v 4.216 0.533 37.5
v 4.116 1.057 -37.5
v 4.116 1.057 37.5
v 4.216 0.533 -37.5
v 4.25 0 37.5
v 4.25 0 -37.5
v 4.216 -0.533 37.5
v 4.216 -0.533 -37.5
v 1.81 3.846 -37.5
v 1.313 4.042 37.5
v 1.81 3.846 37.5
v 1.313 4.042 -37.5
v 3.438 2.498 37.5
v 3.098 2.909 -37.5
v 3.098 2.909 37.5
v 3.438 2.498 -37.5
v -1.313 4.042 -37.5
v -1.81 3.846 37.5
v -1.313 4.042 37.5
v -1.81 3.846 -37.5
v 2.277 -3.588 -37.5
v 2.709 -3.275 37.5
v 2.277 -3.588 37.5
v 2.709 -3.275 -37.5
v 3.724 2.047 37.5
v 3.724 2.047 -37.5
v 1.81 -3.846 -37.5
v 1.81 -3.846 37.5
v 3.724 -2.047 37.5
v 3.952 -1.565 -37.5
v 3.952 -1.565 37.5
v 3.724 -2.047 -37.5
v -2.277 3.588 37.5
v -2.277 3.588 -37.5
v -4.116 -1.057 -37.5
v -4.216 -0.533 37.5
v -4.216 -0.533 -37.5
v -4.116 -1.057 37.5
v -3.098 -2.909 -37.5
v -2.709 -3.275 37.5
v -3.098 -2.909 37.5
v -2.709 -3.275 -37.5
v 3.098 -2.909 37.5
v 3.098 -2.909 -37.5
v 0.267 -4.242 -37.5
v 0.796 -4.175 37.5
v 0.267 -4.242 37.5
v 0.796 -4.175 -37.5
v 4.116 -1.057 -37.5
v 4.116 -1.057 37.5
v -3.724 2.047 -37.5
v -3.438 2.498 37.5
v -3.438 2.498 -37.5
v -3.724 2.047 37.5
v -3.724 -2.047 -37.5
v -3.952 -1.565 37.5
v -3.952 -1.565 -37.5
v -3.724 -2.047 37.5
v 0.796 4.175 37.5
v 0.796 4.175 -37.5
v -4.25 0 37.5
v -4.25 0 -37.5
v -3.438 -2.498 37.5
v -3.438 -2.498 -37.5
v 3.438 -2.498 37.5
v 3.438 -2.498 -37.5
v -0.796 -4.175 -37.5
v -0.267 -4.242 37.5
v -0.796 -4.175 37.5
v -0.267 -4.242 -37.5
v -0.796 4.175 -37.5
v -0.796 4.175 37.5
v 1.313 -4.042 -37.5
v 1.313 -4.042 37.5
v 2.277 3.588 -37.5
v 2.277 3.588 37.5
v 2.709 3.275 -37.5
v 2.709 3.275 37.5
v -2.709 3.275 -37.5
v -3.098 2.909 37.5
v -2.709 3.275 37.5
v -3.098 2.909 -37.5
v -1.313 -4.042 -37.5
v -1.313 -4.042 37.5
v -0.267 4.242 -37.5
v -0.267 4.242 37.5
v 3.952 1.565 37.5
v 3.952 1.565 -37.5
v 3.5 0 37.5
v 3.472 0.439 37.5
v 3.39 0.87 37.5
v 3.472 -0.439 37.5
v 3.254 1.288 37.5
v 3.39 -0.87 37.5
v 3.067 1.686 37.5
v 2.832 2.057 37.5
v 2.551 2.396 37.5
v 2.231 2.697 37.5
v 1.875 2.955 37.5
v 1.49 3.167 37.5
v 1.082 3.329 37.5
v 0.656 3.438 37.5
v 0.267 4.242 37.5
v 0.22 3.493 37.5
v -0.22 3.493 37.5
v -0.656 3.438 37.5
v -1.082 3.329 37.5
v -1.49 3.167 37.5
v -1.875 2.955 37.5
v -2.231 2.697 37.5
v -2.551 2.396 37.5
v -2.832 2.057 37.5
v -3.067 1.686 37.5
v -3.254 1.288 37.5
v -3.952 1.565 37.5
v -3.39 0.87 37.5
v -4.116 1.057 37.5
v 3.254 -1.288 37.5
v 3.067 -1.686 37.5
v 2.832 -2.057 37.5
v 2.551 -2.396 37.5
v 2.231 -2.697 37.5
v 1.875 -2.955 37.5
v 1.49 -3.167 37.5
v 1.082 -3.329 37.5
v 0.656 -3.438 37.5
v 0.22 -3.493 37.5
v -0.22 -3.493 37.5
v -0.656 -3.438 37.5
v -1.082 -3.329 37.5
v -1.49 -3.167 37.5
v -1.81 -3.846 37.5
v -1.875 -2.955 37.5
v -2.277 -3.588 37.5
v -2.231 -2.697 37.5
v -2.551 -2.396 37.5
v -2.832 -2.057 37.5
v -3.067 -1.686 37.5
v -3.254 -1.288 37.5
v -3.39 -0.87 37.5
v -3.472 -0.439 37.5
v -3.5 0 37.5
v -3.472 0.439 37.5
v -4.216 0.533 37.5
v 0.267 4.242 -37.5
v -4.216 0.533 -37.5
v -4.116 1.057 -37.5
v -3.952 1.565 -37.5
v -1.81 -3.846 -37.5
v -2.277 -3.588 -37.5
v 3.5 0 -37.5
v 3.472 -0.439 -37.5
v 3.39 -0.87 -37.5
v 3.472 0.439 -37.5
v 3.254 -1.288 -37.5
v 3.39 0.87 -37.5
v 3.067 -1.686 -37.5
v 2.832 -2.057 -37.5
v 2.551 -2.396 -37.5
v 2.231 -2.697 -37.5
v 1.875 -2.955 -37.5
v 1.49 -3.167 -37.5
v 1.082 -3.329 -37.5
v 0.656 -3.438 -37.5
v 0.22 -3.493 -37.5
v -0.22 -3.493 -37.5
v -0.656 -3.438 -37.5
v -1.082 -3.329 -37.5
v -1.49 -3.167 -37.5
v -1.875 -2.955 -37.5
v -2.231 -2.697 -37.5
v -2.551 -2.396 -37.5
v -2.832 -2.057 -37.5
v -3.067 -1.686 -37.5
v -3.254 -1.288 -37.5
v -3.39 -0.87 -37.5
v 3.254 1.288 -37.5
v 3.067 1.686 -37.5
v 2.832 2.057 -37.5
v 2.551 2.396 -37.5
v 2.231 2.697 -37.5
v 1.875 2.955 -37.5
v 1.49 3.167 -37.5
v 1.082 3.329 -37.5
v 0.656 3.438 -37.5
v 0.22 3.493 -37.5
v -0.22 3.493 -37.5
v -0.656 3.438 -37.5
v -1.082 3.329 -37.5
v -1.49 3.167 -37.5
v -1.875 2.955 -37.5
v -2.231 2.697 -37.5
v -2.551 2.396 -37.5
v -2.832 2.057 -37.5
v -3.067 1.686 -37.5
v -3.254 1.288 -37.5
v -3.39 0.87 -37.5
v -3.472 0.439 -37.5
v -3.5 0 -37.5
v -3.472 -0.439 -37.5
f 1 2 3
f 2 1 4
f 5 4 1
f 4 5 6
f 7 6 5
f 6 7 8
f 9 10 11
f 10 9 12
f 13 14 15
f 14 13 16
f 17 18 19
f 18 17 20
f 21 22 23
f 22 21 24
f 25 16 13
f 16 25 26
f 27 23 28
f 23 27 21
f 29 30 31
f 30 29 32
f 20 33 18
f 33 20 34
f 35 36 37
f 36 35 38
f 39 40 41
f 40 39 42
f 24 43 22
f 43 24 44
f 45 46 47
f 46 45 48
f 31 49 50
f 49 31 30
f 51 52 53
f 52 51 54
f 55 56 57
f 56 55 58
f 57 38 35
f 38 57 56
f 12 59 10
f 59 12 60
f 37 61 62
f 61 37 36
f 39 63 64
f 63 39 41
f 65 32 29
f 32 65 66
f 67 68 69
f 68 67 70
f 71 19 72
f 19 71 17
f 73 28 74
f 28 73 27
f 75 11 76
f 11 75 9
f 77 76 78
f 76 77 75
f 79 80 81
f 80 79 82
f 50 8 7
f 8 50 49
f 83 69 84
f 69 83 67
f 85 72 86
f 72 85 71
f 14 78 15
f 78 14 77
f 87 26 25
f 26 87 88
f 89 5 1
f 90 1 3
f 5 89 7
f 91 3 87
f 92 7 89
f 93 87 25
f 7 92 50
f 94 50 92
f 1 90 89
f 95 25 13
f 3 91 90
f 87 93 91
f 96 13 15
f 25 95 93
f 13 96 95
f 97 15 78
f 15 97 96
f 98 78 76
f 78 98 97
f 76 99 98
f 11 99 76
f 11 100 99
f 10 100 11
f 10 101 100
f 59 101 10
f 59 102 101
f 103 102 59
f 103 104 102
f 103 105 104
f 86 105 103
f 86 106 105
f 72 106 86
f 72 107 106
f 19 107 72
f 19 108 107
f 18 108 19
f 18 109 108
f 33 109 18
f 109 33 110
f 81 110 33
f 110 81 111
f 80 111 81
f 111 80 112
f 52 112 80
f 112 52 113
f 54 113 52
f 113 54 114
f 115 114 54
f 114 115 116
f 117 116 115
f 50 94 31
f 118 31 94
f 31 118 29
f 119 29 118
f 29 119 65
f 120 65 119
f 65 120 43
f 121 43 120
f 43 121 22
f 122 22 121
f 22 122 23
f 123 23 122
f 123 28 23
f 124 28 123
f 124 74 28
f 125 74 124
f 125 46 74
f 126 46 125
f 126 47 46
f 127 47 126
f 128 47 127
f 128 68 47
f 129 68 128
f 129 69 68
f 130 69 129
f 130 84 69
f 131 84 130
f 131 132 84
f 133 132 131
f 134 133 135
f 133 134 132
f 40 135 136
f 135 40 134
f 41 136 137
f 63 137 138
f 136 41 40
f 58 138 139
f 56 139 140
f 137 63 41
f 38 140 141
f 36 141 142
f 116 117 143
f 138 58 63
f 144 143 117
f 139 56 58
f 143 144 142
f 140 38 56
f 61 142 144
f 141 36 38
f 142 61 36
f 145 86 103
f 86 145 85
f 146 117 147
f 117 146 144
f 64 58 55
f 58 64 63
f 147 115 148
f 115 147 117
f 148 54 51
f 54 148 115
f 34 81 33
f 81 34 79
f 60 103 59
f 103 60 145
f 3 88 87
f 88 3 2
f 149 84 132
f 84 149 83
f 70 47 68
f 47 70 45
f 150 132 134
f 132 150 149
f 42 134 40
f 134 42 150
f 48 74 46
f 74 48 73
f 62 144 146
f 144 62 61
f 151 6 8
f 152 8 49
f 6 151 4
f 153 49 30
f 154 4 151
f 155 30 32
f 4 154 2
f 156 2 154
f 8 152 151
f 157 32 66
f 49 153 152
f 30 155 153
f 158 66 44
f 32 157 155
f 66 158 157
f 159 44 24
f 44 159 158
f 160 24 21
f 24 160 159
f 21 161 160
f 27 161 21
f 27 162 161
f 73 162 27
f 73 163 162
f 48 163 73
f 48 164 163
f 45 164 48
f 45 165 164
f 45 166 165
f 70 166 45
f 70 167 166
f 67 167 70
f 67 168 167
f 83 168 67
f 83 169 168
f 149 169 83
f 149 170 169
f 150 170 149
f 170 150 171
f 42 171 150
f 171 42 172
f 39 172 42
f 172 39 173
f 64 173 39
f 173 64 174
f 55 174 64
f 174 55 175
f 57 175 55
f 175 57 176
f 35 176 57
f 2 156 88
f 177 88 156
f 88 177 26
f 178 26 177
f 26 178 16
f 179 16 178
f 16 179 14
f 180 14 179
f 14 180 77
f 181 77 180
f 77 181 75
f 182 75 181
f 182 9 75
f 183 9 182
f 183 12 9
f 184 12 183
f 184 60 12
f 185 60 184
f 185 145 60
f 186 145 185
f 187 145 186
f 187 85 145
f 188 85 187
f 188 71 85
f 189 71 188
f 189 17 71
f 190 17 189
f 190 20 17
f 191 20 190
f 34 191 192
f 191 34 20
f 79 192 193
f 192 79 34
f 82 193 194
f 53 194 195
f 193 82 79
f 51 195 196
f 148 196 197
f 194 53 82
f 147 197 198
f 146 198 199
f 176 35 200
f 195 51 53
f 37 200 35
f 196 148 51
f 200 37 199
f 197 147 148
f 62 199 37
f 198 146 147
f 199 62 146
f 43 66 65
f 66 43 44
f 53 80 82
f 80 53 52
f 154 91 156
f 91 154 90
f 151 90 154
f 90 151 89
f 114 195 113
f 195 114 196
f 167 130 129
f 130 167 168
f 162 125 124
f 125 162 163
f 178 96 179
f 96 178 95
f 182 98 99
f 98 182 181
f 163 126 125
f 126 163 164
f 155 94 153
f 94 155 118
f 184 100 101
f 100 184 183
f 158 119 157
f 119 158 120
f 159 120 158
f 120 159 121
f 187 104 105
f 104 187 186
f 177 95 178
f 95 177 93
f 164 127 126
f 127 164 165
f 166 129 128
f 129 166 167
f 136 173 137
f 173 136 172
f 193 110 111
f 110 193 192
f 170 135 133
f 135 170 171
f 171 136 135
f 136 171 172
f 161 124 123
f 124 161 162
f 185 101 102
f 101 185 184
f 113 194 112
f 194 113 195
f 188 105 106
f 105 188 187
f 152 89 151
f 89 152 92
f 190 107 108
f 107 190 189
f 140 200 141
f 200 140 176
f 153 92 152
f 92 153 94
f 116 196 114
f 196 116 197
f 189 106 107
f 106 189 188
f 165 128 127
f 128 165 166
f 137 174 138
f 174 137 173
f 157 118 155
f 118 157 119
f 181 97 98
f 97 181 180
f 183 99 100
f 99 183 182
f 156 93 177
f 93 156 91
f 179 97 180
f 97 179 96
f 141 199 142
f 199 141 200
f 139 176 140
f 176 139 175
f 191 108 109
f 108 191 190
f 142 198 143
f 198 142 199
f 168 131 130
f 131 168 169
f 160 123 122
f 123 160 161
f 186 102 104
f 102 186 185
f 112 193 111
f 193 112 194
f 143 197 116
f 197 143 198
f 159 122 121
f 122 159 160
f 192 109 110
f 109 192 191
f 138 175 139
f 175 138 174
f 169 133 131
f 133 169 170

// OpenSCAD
$fn = 50;


difference() {
	union() {
		translate(v = [0, 0, -37.5000000000]) {
			cylinder(h = 75, r = 4.2500000000);
		}
	}
	union() {
		translate(v = [0, 0, -100.0000000000]) {
			cylinder(h = 200, r = 3.5000000000);
		}
	}
}
